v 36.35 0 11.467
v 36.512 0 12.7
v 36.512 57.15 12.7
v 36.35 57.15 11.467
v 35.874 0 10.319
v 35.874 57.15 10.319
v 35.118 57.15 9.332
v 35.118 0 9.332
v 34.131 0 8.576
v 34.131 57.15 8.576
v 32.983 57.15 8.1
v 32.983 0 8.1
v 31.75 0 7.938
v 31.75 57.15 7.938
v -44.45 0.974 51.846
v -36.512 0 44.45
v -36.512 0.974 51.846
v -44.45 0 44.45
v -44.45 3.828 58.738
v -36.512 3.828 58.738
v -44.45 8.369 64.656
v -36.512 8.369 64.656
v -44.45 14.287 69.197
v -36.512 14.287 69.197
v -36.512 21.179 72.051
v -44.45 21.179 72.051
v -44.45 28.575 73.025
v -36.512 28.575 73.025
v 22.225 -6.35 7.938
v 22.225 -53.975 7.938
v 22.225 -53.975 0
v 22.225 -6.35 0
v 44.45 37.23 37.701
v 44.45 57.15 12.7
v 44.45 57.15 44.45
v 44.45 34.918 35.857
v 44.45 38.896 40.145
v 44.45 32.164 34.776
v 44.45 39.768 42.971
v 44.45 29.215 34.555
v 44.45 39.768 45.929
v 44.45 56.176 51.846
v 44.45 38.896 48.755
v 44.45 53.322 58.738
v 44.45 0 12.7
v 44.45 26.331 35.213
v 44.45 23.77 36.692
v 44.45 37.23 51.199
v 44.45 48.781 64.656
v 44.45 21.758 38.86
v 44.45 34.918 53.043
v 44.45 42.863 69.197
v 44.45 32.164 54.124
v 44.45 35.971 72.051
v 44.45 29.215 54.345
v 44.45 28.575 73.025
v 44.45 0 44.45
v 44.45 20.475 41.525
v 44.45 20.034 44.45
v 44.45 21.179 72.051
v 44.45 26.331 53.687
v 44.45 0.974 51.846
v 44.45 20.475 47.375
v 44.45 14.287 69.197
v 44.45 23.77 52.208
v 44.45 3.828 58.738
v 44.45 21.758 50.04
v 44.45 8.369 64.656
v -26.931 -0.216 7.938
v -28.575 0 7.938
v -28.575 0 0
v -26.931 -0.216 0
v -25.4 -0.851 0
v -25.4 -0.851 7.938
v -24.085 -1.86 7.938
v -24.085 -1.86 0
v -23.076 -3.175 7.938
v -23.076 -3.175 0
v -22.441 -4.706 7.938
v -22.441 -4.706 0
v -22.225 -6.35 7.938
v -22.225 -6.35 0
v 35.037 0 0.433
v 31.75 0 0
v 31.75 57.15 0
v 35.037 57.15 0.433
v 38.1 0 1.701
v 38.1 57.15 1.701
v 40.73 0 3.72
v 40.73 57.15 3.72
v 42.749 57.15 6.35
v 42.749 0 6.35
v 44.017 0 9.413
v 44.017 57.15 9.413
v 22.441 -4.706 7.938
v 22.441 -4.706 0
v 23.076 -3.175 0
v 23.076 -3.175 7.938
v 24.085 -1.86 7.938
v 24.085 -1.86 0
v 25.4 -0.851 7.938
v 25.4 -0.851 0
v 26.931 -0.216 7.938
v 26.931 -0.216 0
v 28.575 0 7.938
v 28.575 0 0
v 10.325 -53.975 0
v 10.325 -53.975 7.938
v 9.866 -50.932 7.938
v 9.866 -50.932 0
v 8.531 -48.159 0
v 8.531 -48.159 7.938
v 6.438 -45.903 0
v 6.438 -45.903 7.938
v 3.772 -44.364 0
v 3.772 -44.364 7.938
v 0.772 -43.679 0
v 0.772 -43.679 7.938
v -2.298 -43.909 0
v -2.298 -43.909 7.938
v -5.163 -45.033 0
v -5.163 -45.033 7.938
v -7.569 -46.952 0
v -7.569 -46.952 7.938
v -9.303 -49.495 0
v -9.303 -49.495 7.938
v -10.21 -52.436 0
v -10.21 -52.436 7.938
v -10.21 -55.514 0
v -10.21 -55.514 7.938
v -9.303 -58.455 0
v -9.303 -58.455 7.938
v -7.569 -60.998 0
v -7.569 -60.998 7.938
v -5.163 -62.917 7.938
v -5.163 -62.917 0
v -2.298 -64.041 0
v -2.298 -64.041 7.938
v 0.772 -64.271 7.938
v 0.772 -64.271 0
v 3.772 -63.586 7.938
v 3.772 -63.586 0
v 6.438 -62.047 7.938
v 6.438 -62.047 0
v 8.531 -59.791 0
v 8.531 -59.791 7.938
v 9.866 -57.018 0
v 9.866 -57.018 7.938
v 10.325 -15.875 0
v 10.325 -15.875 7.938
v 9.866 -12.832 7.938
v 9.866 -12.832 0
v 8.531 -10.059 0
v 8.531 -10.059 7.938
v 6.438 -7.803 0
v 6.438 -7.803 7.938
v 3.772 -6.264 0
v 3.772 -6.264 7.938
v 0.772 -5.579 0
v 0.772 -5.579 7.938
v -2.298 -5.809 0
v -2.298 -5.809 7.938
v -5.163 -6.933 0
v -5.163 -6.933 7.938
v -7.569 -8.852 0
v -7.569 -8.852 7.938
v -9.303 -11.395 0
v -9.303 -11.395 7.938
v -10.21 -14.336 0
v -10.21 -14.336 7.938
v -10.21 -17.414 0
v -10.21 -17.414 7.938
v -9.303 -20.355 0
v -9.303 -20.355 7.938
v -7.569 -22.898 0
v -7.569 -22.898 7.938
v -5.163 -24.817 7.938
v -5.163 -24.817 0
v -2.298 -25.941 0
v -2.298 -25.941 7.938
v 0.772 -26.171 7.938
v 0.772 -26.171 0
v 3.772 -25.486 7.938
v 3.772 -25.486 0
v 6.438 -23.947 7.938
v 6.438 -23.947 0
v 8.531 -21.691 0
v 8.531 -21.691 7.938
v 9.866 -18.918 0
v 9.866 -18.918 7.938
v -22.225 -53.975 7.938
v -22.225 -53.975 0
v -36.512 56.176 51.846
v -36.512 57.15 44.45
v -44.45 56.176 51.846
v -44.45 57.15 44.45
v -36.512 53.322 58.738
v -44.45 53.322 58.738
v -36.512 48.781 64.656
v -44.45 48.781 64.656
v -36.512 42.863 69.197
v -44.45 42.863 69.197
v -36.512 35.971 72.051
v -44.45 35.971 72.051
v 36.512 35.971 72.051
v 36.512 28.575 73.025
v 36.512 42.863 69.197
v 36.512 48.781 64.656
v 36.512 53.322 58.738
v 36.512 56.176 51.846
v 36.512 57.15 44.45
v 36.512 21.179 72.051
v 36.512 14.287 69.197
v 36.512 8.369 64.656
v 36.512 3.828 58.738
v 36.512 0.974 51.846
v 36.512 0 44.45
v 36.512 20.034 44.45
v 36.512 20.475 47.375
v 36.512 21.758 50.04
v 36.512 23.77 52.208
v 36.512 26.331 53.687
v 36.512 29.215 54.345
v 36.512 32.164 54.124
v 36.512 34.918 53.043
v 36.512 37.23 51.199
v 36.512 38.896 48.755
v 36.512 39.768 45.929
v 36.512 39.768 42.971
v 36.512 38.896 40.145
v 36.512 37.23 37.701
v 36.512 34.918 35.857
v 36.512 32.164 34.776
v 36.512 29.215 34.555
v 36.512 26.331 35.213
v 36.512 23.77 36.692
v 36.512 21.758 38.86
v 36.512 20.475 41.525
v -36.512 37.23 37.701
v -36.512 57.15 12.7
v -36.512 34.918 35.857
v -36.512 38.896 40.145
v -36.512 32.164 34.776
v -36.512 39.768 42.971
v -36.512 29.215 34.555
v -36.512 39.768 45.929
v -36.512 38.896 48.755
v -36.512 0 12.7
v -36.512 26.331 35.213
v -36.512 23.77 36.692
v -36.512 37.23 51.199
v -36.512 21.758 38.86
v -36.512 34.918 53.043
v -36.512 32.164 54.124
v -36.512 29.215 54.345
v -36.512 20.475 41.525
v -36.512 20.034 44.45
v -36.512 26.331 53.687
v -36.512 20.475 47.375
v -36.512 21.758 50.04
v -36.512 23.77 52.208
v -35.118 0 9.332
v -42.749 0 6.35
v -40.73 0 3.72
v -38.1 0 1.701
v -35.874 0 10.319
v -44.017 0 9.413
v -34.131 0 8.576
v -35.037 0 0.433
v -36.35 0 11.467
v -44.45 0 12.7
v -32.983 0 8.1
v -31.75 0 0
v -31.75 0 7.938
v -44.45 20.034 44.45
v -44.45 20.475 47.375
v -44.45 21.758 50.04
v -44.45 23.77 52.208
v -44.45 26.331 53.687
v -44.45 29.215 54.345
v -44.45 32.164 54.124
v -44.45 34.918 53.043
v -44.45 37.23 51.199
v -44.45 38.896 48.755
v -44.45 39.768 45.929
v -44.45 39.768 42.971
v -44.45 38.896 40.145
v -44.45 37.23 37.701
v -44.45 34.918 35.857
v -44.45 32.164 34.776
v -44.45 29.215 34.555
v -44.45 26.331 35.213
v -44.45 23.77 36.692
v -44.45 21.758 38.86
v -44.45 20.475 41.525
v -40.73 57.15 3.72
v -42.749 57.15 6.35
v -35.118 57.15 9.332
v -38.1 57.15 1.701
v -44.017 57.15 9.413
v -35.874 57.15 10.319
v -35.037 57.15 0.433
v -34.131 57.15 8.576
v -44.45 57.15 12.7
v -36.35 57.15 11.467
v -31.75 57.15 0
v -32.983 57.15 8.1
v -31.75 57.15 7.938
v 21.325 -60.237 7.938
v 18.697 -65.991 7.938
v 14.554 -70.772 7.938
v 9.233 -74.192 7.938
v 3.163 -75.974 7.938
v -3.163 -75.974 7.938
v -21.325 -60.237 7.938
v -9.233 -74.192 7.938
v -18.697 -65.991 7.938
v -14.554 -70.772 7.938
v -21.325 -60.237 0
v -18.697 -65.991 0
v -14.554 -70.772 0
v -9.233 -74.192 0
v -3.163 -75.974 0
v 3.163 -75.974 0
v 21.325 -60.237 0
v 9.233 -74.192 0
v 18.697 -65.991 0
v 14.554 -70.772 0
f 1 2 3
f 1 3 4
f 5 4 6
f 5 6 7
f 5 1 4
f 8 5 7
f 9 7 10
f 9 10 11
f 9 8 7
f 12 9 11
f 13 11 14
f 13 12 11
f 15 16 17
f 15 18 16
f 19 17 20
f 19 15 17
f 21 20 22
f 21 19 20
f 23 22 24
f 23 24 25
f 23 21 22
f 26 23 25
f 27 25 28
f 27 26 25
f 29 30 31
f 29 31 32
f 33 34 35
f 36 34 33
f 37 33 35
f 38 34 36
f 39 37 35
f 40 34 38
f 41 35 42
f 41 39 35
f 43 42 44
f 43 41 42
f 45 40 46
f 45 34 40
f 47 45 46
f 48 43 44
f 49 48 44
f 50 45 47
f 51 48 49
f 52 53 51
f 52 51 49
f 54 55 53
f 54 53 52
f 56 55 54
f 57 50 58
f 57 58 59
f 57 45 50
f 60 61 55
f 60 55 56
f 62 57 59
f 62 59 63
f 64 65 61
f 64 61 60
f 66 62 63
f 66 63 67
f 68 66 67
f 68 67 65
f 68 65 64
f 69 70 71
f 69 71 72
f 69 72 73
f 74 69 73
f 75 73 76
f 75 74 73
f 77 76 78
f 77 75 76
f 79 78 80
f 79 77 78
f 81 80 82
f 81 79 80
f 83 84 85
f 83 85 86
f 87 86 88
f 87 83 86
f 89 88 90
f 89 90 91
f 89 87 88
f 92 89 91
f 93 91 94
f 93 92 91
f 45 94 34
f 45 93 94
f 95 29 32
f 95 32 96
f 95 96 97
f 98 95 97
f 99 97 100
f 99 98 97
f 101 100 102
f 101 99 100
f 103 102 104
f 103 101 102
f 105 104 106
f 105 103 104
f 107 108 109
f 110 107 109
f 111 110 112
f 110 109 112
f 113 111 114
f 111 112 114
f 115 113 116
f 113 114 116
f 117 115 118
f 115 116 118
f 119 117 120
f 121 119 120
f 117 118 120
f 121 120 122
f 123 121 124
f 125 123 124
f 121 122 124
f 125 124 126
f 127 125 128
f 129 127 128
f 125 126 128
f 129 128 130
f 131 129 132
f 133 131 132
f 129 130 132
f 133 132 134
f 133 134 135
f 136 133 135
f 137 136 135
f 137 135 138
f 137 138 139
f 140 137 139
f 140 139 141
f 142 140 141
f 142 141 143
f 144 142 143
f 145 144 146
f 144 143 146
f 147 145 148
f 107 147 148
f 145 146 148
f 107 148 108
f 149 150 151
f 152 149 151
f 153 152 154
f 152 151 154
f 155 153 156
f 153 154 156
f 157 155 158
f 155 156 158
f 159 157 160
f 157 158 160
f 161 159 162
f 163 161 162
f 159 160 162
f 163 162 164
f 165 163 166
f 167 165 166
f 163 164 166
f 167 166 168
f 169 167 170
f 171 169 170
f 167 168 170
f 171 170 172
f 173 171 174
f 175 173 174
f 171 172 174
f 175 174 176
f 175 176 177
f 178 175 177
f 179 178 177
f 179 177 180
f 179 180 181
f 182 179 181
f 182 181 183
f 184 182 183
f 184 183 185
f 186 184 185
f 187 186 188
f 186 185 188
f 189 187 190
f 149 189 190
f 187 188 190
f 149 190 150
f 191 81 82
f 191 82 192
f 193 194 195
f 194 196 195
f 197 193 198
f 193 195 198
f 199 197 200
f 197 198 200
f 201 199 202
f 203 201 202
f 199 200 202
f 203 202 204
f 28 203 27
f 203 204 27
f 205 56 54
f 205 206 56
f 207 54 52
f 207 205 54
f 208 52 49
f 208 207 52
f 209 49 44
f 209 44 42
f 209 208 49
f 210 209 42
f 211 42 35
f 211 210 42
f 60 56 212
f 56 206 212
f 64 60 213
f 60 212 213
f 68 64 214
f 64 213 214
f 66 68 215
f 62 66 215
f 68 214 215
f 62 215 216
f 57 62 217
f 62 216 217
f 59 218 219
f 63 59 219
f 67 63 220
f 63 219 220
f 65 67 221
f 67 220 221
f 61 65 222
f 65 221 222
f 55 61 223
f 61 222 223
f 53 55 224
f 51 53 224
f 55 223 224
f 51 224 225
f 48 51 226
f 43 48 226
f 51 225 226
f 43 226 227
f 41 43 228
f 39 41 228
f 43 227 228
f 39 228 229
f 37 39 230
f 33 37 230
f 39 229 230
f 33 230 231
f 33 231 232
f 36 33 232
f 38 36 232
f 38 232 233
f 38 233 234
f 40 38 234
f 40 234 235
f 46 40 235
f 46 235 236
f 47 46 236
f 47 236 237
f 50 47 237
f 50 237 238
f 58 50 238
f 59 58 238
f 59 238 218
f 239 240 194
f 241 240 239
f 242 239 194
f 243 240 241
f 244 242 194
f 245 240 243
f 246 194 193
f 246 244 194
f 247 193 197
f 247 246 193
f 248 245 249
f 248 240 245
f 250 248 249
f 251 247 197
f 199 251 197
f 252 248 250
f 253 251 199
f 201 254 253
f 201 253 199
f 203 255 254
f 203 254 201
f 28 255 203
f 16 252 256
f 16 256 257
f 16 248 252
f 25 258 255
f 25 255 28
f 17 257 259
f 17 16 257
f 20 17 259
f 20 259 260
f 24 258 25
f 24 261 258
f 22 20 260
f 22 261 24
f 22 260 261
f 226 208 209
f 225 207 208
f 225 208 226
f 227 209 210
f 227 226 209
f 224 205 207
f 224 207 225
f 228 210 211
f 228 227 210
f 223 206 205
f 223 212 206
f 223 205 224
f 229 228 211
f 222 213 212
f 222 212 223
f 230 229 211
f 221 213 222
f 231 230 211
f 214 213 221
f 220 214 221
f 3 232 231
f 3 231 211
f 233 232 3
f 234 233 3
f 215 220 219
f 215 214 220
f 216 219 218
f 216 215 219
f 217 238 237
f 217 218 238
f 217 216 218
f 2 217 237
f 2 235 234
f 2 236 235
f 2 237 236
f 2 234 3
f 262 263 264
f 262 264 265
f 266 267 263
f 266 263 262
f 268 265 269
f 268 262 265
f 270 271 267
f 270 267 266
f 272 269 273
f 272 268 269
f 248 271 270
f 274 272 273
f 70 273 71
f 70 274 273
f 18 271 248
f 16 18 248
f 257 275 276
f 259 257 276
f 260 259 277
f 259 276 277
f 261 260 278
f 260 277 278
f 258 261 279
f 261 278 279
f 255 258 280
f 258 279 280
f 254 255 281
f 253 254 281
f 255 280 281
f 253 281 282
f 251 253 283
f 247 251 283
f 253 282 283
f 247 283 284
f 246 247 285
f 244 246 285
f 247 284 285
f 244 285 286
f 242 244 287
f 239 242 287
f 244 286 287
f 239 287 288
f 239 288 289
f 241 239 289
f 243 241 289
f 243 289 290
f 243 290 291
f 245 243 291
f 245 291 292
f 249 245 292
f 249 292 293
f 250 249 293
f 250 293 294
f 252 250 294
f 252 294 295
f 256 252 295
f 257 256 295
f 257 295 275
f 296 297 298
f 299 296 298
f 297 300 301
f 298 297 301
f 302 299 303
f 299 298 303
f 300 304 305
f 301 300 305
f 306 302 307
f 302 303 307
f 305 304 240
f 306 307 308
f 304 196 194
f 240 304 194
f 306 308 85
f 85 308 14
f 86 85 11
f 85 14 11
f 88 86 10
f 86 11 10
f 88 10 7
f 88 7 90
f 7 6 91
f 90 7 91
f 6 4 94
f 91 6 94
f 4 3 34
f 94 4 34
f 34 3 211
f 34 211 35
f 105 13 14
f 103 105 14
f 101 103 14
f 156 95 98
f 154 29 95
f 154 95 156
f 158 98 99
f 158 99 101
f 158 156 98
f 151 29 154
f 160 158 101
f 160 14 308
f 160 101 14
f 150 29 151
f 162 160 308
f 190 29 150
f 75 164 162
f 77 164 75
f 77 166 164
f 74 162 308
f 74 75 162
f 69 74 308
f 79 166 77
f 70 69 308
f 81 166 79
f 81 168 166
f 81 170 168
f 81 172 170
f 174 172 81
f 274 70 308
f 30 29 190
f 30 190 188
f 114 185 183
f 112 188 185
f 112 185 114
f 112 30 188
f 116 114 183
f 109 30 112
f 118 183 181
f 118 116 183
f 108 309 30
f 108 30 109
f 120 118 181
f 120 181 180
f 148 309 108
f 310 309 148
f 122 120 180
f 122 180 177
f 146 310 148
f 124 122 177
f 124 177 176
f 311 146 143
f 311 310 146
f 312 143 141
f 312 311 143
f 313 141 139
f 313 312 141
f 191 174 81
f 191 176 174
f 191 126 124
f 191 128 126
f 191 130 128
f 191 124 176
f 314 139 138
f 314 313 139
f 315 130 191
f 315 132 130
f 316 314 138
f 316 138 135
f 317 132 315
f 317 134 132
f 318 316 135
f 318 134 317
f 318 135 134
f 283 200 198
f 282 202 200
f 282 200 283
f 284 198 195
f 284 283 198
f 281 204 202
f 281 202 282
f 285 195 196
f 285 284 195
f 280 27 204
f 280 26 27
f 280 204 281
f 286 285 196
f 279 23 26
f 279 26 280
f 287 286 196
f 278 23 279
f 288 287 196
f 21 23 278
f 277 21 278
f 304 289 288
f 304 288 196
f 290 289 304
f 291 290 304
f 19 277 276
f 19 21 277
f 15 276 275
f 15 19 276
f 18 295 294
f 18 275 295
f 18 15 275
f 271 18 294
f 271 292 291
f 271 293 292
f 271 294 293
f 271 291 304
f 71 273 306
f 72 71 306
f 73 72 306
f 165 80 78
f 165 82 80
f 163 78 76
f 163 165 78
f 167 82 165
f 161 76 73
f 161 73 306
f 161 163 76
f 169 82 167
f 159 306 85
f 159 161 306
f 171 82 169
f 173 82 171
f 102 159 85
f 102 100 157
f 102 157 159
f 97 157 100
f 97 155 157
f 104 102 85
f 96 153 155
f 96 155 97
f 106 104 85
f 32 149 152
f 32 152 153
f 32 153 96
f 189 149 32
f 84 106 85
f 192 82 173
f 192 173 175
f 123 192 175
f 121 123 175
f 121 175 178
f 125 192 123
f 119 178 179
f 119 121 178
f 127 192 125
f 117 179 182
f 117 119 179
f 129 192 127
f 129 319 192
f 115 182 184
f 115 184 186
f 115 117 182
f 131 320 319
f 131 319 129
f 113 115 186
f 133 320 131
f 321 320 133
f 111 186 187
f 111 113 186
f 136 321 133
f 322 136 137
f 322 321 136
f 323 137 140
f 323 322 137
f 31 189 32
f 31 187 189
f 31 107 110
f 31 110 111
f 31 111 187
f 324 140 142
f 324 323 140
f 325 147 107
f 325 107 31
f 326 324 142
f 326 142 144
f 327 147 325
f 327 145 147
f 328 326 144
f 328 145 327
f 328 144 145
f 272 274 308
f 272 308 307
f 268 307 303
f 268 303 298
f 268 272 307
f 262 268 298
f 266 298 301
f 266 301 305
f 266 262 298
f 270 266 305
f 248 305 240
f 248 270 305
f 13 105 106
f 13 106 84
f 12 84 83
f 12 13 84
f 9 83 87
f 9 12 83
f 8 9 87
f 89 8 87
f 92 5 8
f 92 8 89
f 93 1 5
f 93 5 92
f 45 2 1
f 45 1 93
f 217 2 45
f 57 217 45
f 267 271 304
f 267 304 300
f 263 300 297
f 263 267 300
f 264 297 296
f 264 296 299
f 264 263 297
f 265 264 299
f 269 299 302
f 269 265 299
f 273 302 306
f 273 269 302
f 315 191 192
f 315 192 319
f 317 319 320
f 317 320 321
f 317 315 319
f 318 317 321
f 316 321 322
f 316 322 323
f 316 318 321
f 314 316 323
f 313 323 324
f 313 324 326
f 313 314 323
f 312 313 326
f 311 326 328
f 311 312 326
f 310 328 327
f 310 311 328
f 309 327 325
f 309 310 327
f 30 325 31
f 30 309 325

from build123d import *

# Parameters (mm, degrees)
F1_DEPTH = 57.15
F2_R     = 28.57499
F3_R     = 28.57499
F4_R     = 9.92251
F5_DEPTH = 88.901
F6_R     = 10.3251
F7_DEPTH = 7.9375


# Not quite as in the source:
# - a fillet or chamfer is up to 0.001 mm smaller than in the source, because OpenCascade refuses the exact size


with BuildPart() as f1:
    # F0 (on Front) → F1 (new body)
    with BuildSketch(Plane.XZ):
        with BuildLine():
            ThreePointArc((-44.45, 12.7), (-40.7302561211, 3.7197438789), (-31.75, 0))
            Line((-31.75, 0), (31.75, 0))
            ThreePointArc((31.75, 0), (40.7302561211, 3.7197438789), (44.45, 12.7))
            Line((44.45, 12.7), (44.45, 73.025))
            Line((44.45, 73.025), (36.5125, 73.025))
            Line((36.5125, 73.025), (36.5125, 12.7))
            ThreePointArc((36.5125, 12.7), (35.1175960454, 9.3324039546), (31.75, 7.9375))
            Line((31.75, 7.9375), (-31.75, 7.9375))
            ThreePointArc((-31.75, 7.9375), (-35.1175960454, 9.3324039546), (-36.5125, 12.7))
            Line((-36.5125, 12.7), (-36.5125, 73.025))
            Line((-36.5125, 73.025), (-44.45, 73.025))
            Line((-44.45, 73.025), (-44.45, 12.7))
        make_face()
    extrude(amount=-F1_DEPTH)

    # F2 (radius 28.575 in the source; OpenCascade refuses exactly that, so slightly less here)
    f2_edges = [f1.edges().sort_by_distance(p)[0] for p in [
        (40.48125, 0, 73.025),
        (40.48125, 57.15, 73.025),
    ]]
    fillet(f2_edges, radius=F2_R)

    # F3 (radius 28.575 in the source; OpenCascade refuses exactly that, so slightly less here)
    f3_edges = [f1.edges().sort_by_distance(p)[0] for p in [
        (-40.48125, 0, 73.025),
        (-40.48125, 57.15, 73.025),
    ]]
    fillet(f3_edges, radius=F3_R)

    # F4 (on face) → F5 (cut, through all)
    with BuildSketch(Plane(origin=(-44.45, 0, 0), x_dir=(0, -1, 0), z_dir=(-1, 0, 0))):
        with Locations((-29.956350103, 44.45)):
            Circle(F4_R)
    extrude(amount=-F5_DEPTH, mode=Mode.SUBTRACT)

    # F6 (on face) → F7 (join, through all)
    with BuildSketch(Plane.XY.offset(7.9375)):
        with BuildLine():
            Line((22.225, -53.975), (22.225, -6.35))
            ThreePointArc((22.225, -6.35), (24.0848719395, -1.8598719395), (28.575, 0))
            Line((28.575, 0), (-28.575, 0))
            ThreePointArc((-28.575, 0), (-24.0848719395, -1.8598719395), (-22.225, -6.35))
            Line((-22.225, -6.35), (-22.225, -53.975))
            ThreePointArc((-22.225, -53.975), (0, -76.2), (22.225, -53.975))
        make_face()
        with Locations((0, -53.975)):
            Circle(F6_R, mode=Mode.SUBTRACT)
        with Locations((0, -15.875)):
            Circle(F6_R, mode=Mode.SUBTRACT)
    extrude(amount=-F7_DEPTH)


solid = f1.part
